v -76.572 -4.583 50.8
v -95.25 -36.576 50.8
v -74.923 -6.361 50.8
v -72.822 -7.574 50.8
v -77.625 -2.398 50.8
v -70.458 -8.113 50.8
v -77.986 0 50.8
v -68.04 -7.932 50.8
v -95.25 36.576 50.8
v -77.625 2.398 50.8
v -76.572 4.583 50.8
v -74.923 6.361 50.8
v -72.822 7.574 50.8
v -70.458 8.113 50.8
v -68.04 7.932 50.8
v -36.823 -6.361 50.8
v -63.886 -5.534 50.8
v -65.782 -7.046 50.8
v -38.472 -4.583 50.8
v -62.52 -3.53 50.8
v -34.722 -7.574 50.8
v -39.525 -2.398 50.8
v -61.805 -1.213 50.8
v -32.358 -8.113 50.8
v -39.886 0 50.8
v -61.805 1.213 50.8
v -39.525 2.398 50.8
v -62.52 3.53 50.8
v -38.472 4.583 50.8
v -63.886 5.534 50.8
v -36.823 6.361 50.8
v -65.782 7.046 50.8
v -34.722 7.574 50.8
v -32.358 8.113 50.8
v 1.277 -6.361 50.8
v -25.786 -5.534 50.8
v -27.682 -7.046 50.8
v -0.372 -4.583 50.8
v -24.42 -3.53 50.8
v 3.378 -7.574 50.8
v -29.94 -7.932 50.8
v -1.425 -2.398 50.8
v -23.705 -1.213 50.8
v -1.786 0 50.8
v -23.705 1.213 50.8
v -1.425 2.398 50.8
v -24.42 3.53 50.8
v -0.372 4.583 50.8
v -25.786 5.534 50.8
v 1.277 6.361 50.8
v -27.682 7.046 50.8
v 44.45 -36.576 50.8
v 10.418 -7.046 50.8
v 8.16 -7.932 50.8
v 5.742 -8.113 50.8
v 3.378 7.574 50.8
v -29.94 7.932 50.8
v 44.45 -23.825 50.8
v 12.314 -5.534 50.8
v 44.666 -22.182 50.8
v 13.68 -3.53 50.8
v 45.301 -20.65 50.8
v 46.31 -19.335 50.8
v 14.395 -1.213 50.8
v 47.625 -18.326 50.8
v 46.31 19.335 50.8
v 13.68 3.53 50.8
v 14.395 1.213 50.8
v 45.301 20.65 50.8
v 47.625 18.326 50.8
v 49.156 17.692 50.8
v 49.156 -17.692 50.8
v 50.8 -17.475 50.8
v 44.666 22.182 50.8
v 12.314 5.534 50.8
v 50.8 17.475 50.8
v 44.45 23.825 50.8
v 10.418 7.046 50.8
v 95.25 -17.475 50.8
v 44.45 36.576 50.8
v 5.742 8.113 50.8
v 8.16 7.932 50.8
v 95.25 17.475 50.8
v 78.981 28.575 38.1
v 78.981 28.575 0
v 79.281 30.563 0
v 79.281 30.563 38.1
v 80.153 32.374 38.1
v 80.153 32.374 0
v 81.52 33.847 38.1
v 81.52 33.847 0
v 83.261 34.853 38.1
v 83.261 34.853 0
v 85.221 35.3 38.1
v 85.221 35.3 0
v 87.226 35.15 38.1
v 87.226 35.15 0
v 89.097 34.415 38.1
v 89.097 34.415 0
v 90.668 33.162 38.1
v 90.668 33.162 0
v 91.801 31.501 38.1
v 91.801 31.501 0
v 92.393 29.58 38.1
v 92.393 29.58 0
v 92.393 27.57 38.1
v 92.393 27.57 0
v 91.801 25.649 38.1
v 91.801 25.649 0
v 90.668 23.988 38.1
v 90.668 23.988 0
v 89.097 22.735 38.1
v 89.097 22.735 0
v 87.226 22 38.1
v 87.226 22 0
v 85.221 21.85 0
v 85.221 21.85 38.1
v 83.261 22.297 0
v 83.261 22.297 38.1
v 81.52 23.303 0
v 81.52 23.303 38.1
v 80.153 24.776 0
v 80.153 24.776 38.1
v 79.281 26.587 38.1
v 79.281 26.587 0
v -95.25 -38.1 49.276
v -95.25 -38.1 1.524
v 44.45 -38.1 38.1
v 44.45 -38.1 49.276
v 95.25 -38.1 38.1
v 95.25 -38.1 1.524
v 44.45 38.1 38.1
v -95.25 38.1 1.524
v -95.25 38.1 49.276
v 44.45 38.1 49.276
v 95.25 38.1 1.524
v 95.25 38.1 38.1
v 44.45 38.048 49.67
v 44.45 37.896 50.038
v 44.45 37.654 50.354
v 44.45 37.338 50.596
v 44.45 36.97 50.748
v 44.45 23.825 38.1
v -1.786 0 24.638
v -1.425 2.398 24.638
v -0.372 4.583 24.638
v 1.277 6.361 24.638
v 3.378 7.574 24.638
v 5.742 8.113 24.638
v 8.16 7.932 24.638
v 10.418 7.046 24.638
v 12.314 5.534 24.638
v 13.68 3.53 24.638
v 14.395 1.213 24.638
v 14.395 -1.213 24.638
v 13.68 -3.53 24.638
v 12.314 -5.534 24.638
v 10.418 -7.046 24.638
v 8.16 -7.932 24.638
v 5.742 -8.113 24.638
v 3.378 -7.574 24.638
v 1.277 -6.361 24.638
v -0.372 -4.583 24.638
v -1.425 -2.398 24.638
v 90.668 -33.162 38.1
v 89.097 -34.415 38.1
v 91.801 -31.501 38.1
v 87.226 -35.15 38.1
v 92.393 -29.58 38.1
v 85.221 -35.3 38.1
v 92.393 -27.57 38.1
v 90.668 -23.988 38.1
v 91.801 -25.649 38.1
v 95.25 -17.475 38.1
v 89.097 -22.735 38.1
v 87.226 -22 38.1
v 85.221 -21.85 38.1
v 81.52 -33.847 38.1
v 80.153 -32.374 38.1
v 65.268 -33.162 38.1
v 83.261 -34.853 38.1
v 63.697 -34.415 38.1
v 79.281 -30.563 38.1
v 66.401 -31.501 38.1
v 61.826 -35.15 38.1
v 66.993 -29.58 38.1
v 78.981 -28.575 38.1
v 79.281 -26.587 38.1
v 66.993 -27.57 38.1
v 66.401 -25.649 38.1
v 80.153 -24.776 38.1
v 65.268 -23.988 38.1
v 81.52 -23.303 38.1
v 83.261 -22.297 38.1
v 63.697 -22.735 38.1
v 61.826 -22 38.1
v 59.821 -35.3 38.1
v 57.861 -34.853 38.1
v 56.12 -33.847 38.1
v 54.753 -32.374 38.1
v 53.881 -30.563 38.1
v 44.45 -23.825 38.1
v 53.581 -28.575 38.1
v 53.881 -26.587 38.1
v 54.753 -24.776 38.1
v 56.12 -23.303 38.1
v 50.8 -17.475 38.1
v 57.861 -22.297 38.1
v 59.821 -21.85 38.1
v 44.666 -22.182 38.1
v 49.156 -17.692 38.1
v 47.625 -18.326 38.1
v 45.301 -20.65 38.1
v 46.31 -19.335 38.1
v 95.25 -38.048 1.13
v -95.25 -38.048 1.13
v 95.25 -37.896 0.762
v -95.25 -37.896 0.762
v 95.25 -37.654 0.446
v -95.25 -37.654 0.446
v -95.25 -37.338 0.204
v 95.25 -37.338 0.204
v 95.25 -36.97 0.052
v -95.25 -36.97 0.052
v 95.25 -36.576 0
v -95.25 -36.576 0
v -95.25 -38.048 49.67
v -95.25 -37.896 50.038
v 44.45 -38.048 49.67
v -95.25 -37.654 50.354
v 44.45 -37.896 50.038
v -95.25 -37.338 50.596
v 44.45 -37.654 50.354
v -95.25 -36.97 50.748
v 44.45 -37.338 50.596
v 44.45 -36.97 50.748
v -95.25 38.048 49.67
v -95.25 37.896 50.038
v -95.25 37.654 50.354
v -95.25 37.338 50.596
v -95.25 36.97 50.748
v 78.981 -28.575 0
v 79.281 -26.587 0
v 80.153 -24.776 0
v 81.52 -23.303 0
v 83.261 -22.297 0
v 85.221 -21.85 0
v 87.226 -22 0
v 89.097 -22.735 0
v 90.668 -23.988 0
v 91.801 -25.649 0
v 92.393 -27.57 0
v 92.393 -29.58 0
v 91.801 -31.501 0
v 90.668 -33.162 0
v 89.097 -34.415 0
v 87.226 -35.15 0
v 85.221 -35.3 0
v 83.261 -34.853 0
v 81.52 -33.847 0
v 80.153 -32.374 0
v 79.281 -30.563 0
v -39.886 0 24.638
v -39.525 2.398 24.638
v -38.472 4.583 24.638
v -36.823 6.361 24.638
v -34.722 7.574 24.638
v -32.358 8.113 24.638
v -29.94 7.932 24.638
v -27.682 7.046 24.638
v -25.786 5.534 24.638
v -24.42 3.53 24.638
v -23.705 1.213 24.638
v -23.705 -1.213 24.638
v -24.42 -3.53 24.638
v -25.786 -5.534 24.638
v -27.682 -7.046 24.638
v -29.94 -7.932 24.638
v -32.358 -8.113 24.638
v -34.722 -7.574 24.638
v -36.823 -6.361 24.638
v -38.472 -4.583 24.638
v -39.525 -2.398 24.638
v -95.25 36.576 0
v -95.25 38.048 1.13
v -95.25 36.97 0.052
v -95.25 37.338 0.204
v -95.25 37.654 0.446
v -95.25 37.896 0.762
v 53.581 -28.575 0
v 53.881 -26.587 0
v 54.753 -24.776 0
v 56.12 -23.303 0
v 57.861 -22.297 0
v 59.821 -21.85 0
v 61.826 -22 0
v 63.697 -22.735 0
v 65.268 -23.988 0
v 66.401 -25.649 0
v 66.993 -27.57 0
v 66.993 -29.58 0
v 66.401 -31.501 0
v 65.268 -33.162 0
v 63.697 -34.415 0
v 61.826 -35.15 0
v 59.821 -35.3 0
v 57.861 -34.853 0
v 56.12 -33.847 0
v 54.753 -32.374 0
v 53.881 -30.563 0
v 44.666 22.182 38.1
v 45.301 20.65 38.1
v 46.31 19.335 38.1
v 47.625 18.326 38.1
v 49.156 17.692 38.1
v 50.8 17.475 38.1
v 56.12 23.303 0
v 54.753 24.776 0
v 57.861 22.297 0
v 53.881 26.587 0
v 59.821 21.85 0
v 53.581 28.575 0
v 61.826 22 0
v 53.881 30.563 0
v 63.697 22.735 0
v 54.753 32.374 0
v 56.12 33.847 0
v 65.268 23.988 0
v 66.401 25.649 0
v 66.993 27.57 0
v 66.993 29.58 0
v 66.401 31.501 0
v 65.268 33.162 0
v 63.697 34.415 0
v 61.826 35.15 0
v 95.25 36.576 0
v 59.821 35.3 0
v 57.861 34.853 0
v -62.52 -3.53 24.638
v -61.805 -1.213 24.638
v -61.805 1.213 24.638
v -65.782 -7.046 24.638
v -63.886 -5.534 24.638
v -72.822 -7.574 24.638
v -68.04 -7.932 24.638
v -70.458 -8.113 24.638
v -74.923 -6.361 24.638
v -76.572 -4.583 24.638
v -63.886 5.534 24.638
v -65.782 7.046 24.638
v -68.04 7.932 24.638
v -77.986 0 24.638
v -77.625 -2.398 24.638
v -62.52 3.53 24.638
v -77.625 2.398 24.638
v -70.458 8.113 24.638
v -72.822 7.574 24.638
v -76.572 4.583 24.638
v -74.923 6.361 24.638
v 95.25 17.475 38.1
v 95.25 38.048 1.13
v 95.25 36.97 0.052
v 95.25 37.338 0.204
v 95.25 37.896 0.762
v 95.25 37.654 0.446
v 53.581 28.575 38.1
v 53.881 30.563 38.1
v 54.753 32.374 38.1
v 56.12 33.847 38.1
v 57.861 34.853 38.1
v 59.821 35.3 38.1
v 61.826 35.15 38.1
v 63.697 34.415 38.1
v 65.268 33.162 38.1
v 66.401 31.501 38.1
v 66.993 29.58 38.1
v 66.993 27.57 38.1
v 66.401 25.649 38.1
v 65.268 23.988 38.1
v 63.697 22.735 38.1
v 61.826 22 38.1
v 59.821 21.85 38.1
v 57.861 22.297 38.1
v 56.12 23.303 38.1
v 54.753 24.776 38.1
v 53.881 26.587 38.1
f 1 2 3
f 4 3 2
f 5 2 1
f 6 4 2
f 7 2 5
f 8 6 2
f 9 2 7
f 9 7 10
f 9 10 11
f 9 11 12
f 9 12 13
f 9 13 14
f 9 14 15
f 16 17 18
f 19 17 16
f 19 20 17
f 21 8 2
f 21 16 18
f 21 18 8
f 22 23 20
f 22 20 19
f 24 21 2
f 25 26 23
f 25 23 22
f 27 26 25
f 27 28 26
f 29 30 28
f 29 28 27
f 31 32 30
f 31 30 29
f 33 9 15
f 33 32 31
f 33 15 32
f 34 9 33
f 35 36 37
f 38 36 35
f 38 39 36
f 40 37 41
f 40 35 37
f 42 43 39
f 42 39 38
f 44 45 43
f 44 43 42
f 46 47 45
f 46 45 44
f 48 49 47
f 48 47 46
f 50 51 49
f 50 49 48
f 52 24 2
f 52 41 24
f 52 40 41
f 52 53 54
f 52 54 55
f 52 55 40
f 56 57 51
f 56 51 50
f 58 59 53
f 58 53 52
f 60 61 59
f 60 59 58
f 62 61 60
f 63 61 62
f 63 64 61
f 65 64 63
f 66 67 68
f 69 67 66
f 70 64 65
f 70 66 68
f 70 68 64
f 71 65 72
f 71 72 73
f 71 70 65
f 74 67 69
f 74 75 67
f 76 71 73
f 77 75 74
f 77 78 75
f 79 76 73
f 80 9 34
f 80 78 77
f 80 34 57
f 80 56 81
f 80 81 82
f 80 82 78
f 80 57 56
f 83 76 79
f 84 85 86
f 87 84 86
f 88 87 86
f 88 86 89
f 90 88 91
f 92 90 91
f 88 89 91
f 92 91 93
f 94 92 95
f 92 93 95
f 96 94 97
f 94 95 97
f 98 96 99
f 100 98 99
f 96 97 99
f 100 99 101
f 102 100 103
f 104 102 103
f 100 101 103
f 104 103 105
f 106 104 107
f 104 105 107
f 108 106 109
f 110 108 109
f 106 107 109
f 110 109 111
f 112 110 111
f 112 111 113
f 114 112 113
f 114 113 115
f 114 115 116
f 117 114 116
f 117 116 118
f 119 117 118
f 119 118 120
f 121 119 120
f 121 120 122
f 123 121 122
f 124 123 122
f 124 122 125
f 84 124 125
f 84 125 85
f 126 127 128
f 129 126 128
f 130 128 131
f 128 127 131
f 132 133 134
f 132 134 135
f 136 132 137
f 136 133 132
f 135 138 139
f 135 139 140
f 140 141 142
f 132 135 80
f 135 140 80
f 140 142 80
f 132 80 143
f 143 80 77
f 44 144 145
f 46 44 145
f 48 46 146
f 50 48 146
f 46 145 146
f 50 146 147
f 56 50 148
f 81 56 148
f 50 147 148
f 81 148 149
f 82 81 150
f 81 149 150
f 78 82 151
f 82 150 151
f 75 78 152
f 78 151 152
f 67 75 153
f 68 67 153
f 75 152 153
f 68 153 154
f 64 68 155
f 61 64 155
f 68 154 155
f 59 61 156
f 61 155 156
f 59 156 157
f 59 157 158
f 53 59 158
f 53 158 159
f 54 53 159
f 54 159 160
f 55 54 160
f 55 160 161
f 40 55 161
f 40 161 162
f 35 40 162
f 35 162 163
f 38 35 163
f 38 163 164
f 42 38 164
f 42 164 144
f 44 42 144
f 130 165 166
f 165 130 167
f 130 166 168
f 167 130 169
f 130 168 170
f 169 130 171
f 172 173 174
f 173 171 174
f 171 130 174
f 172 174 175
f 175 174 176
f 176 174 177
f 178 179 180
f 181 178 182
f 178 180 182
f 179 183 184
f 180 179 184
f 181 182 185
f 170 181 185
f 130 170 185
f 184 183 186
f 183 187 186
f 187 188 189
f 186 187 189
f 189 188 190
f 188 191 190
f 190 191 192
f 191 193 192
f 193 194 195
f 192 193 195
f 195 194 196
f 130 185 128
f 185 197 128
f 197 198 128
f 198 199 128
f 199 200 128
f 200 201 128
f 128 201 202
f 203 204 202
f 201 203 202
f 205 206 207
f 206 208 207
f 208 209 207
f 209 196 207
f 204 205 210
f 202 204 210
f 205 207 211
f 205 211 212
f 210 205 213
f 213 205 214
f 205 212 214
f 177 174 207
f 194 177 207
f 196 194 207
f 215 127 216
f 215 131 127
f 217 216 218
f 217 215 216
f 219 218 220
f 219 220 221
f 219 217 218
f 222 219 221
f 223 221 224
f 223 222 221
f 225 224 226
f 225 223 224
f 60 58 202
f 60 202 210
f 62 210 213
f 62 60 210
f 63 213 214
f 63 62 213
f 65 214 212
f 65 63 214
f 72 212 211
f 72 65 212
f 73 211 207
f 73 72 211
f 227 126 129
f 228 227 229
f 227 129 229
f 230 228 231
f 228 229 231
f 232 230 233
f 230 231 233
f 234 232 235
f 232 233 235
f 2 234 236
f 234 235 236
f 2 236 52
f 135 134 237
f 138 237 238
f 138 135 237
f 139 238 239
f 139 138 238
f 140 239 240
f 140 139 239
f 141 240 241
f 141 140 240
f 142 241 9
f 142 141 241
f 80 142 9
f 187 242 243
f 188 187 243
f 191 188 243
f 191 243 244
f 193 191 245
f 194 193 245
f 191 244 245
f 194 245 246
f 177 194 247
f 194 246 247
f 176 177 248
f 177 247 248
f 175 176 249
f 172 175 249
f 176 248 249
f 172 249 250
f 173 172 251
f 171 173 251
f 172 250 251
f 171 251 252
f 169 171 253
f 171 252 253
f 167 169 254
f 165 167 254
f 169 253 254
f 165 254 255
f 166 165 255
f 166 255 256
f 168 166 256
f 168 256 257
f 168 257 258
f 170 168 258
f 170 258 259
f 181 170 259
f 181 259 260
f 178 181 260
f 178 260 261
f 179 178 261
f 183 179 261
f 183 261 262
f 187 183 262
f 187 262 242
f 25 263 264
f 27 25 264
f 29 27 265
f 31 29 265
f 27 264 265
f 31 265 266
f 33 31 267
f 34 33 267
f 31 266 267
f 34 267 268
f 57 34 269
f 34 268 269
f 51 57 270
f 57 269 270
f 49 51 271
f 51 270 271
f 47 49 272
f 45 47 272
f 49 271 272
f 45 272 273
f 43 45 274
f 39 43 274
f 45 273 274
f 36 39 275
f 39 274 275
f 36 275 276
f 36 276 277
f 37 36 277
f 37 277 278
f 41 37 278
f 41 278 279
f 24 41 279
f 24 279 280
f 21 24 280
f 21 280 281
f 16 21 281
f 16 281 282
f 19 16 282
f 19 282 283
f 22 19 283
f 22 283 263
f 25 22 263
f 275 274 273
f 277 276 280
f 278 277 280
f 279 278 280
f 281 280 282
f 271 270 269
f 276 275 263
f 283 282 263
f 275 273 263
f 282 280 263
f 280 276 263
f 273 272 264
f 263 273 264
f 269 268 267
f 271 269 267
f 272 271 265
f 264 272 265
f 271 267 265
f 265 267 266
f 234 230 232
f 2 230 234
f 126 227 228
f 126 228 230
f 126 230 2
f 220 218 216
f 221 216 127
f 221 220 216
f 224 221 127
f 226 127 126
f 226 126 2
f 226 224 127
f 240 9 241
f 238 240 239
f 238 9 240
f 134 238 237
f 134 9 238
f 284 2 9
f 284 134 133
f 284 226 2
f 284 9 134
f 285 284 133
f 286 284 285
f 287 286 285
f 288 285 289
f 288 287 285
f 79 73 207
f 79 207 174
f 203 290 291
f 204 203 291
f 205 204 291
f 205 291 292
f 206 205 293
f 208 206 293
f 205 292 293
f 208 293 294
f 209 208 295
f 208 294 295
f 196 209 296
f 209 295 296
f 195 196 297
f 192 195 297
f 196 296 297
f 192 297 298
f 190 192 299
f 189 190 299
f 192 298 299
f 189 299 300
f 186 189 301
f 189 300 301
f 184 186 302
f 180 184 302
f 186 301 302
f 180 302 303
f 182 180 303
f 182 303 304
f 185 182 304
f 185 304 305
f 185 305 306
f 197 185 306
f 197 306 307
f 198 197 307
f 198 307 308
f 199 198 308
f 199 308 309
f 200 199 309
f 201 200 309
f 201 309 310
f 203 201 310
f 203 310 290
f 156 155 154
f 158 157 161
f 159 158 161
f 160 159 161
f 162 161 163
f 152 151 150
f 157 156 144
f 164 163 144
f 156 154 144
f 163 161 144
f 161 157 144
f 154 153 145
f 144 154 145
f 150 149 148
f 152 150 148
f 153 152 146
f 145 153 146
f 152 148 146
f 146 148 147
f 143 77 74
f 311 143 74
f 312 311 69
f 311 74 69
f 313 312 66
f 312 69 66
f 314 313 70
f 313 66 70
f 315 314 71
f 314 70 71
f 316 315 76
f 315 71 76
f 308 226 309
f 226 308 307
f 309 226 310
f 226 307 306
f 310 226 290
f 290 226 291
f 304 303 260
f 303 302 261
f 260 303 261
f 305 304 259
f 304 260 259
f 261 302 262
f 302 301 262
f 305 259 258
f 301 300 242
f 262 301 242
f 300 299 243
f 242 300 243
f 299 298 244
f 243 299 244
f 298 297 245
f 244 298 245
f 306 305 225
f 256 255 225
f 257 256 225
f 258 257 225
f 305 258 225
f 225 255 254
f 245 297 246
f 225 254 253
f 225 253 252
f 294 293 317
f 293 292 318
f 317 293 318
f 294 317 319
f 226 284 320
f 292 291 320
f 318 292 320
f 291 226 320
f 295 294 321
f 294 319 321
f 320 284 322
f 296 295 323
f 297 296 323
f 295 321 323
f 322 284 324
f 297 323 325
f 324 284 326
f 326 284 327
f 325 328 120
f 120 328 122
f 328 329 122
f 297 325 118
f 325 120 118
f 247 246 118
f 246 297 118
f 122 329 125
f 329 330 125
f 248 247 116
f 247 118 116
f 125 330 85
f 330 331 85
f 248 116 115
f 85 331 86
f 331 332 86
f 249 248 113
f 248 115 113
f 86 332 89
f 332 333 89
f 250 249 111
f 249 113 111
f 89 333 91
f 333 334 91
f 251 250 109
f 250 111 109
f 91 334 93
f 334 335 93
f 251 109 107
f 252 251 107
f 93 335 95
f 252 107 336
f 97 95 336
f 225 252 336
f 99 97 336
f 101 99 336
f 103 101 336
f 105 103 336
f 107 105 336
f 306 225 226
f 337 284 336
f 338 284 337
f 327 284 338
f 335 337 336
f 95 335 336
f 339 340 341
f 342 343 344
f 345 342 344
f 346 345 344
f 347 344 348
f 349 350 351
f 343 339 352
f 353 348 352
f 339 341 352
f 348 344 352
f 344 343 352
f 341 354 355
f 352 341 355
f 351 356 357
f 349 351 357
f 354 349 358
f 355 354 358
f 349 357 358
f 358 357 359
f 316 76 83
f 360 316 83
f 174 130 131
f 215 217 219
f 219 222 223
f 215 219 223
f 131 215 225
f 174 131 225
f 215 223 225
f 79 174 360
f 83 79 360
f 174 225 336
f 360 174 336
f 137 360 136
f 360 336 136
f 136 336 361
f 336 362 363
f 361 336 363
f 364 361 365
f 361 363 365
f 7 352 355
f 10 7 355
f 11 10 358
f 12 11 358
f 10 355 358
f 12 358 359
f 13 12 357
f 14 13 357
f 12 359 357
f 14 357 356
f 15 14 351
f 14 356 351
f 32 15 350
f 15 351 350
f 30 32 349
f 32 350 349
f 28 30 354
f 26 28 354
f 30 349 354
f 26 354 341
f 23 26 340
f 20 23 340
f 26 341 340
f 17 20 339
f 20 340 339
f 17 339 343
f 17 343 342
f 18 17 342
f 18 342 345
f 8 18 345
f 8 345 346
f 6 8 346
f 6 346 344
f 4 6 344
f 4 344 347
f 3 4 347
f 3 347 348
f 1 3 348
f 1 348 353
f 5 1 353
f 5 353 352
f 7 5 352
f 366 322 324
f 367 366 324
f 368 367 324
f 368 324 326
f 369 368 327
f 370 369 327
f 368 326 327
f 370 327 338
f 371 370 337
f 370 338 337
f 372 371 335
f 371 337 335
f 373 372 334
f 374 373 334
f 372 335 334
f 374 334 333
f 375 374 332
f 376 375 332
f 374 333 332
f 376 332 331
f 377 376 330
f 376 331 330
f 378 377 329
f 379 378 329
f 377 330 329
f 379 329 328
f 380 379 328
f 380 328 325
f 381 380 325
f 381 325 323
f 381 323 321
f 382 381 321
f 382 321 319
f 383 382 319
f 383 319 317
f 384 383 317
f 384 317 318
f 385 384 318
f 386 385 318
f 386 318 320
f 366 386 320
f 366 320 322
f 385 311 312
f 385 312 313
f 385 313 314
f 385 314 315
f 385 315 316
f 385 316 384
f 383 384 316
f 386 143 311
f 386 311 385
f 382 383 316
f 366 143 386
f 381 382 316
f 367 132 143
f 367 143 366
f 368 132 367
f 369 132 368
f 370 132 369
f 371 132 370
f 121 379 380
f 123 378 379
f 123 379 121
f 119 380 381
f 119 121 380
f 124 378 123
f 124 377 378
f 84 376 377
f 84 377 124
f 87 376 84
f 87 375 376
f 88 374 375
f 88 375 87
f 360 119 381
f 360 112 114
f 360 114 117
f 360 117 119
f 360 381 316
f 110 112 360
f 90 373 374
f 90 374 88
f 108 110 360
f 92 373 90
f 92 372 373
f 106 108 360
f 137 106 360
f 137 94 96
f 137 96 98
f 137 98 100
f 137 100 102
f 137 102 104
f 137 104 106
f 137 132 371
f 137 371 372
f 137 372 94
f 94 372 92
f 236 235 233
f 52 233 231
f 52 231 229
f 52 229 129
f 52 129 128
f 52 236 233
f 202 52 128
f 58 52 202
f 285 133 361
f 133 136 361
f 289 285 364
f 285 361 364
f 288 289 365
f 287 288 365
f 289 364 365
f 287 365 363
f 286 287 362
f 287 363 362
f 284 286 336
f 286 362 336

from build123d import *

# Parameters (mm, degrees)
SKETCH1_W                            = 190.5
SKETCH1_H                            = 76.2
BOSS_EXTRUDE1_DEPTH                  = 50.8
FILLET1_R                            = 1.524
F_41_64_0_64063_DIAMETER_HOLE1_D     = 16.272002
F_41_64_0_64063_DIAMETER_HOLE1_DEPTH = 26.162
F_1_2_0_5_DIAMETER_HOLE1_D           = 13.4874
CUT_EXTRUDE1_DEPTH                   = 12.7


with BuildPart() as part:
    # Sketch1 → Boss-Extrude1 (new body)
    with BuildSketch(Plane.XY):
        Rectangle(SKETCH1_W, SKETCH1_H)
    extrude(amount=BOSS_EXTRUDE1_DEPTH)

    # Fillet1
    fillet1_edges = [part.edges().sort_by_distance(p)[0] for p in [
        (0, 38.1, 50.8),
        (0, 38.1, 0),
        (0, -38.1, 0),
        (0, -38.1, 50.8),
    ]]
    fillet(fillet1_edges, radius=FILLET1_R)

    # 41/64 (0.64063) Diameter Hole1
    with Locations(Plane.XY.offset(50.8)):
        with Locations((-69.85, 0), (-31.75, 0), (6.35, 0)):
            Hole(F_41_64_0_64063_DIAMETER_HOLE1_D / 2, depth=F_41_64_0_64063_DIAMETER_HOLE1_DEPTH)

    # 1/2 (0.5) Diameter Hole1 (through all)
    with Locations(Plane.XY.offset(50.8)):
        with Locations((60.325, 28.575), (85.725, 28.575), (60.325, -28.575), (85.725, -28.575)):
            Hole(F_1_2_0_5_DIAMETER_HOLE1_D / 2)

    # Sketch7 → Cut-Extrude1 (cut)
    with BuildSketch(Plane.XY.offset(50.8)):
        with BuildLine():
            Line((95.25, 38.1), (44.45, 38.1))
            Line((44.45, 38.1), (44.45, 23.8252))
            ThreePointArc((44.45, 23.8252), (46.309871939, 19.335071939), (50.8, 17.4752))
            Line((50.8, 17.4752), (95.25, 17.4752))
            Line((95.25, 17.4752), (95.25, 38.1))
        make_face()
        with BuildLine():
            Line((50.8, -17.4752), (95.25, -17.4752))
            Line((95.25, -17.4752), (95.25, -38.1))
            Line((95.25, -38.1), (44.45, -38.1))
            Line((44.45, -38.1), (44.45, -23.8252))
            ThreePointArc((44.45, -23.8252), (46.309871939, -19.335071939), (50.8, -17.4752))
        make_face()
    extrude(amount=-CUT_EXTRUDE1_DEPTH, mode=Mode.SUBTRACT)


solid = part.part
